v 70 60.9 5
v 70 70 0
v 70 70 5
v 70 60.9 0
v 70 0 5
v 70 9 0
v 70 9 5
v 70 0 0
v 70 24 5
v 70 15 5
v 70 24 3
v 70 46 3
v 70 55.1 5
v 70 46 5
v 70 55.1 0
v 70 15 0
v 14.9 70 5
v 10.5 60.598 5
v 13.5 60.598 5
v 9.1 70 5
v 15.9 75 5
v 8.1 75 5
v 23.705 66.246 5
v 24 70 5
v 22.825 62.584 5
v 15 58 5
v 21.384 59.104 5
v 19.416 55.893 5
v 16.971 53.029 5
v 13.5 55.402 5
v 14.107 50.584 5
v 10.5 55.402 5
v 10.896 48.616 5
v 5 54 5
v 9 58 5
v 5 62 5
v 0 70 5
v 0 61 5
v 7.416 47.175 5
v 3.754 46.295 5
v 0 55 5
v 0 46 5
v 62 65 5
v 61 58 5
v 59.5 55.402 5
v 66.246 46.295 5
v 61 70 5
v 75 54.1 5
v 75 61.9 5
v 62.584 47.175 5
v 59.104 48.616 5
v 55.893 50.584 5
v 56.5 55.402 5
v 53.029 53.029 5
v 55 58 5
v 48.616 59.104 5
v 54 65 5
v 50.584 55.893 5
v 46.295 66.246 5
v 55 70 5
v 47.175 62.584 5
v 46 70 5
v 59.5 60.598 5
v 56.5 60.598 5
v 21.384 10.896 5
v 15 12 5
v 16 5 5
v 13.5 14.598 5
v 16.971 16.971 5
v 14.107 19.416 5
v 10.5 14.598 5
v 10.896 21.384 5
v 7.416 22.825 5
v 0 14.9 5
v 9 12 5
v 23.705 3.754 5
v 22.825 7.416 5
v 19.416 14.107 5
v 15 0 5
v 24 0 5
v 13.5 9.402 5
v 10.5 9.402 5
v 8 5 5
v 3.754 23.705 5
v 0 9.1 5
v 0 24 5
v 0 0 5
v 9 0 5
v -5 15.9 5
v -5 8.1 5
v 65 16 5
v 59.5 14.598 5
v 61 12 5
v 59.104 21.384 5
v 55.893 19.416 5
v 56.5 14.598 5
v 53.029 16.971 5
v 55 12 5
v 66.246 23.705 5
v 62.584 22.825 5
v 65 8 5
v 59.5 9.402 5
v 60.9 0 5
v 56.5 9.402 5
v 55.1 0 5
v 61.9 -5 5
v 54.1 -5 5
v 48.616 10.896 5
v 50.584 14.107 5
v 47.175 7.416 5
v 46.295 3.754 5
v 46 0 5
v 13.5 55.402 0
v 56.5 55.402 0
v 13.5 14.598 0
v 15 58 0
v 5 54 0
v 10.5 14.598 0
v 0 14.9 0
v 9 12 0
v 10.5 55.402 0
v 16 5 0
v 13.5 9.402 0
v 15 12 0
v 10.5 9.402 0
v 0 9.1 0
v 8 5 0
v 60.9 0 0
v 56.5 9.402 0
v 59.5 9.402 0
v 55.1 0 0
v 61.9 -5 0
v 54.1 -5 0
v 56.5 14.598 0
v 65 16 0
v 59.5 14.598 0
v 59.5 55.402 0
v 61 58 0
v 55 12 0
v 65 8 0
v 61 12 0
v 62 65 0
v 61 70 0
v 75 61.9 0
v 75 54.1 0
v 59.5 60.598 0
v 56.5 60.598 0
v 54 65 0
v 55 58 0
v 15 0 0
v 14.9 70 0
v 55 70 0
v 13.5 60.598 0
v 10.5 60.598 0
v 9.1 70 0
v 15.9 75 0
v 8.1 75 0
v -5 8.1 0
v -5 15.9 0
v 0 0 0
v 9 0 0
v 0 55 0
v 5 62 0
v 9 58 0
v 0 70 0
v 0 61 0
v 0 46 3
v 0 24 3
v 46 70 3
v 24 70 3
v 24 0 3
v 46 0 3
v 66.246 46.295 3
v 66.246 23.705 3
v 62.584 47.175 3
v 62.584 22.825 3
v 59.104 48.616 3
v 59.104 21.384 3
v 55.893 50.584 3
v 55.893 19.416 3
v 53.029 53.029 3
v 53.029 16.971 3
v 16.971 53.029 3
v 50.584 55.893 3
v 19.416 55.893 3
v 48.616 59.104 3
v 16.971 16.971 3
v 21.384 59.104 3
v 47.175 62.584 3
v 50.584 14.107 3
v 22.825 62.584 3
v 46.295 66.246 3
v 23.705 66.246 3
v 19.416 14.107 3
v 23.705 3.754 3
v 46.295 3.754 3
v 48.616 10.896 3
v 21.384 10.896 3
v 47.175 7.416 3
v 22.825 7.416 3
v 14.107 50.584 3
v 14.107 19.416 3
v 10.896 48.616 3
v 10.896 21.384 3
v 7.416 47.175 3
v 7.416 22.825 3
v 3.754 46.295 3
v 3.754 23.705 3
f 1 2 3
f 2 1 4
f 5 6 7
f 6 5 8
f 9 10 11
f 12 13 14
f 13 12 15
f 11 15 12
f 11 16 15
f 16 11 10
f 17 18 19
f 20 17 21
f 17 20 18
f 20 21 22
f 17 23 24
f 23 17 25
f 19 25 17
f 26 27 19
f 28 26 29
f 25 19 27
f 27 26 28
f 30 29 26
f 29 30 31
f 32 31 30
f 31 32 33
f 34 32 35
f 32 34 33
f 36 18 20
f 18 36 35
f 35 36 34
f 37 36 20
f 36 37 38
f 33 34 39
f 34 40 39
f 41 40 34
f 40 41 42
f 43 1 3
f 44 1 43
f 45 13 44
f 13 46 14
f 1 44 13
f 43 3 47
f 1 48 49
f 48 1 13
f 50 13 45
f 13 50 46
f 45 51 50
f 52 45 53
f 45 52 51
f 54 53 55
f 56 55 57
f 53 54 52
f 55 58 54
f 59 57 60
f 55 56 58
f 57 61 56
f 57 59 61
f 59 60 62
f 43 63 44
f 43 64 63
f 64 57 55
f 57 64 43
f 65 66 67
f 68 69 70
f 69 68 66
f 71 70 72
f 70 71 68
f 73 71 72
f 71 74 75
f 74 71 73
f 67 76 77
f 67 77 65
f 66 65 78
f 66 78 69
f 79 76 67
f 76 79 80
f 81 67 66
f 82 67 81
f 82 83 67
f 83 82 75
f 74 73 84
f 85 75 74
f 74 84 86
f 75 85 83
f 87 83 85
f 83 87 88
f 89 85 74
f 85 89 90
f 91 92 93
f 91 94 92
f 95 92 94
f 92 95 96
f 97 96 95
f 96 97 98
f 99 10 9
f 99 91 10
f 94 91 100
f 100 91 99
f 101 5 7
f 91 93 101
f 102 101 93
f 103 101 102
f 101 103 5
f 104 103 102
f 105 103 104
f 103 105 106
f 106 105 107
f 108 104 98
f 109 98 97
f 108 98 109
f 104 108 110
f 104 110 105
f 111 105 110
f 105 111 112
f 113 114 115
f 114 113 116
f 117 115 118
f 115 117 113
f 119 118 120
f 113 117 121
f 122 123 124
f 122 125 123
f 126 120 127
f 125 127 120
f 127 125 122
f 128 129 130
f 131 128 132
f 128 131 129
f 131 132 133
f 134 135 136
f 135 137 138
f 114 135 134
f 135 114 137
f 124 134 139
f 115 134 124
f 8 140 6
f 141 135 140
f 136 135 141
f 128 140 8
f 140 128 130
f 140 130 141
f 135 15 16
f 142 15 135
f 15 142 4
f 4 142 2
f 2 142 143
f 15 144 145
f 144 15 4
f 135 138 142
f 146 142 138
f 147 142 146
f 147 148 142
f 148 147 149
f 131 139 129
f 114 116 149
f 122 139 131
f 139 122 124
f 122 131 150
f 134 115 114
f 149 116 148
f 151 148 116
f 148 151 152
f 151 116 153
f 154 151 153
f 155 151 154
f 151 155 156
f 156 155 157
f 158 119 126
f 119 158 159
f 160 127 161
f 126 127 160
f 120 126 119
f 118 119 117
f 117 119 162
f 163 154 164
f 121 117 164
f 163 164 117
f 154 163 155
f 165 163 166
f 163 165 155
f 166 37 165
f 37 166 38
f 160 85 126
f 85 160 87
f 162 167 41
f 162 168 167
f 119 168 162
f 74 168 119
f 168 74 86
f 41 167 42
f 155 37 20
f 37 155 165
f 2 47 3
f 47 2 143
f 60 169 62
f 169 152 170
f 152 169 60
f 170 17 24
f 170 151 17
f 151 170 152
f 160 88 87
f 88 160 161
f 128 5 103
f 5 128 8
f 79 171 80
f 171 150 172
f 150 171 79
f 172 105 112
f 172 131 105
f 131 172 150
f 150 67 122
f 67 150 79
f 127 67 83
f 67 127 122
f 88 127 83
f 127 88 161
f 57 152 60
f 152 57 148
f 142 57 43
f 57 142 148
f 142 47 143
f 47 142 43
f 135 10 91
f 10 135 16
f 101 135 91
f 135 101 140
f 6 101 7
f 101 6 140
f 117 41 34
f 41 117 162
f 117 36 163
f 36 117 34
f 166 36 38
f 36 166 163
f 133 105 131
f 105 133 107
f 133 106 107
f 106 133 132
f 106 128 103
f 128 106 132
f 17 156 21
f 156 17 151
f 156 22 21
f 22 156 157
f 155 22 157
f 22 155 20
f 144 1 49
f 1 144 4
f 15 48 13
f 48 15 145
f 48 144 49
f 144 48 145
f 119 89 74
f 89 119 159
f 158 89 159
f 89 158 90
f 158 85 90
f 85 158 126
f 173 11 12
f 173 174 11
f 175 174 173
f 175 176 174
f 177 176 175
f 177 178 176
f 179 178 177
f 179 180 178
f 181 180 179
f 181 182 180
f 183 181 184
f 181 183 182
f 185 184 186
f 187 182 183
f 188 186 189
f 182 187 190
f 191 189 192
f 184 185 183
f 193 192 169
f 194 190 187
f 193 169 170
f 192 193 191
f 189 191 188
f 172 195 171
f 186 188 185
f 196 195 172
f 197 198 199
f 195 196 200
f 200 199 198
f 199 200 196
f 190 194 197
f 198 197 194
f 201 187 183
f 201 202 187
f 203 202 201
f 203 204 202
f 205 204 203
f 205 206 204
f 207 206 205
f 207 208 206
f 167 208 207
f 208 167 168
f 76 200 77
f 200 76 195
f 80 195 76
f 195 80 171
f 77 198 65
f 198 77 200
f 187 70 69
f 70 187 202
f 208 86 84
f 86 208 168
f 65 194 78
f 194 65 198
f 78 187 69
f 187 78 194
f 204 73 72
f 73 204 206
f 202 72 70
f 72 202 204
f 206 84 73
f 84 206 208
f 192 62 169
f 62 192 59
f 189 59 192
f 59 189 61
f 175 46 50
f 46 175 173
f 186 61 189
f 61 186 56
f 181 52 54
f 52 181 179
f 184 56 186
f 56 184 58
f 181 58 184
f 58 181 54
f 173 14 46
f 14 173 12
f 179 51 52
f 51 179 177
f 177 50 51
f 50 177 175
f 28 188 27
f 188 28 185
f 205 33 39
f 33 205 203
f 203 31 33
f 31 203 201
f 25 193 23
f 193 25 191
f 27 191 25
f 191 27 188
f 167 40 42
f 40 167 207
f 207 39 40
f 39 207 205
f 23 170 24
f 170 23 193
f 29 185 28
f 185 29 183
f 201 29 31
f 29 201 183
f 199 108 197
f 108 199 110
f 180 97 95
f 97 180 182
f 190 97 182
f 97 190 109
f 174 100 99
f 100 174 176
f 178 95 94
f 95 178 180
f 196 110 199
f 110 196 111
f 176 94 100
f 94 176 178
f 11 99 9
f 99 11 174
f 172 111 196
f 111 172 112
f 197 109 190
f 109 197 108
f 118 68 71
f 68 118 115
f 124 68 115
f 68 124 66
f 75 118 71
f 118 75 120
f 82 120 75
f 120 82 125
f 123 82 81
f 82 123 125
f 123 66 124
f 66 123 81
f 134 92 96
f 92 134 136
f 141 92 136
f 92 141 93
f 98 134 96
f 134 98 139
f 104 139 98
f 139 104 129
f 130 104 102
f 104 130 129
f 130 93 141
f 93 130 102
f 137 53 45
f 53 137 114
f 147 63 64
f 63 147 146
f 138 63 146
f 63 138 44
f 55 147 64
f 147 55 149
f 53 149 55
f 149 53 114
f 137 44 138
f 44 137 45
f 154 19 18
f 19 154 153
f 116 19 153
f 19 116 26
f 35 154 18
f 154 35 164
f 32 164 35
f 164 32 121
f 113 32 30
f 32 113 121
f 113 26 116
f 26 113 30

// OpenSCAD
//side of the base
side = 70;
//width of the track
trackWidth = 22;
//Height of the pieces
height = 5;
//dimensions of the indents that fix the tiles
indentLength = 8;
indentWidth = 5;
indentSlope = 1; //difference between long and short sides of the indent
indentClearance = 0.2; //it applies to the out indents, reducing their length, higher values mean looser connections
//This is equal to the thickness of the tile under the track
trackOffset = 3;
//holes
holeRadius = 3;
holePosX = 12;
holePosY = holePosX;
//base();
//straight();
//curve();
//deadEnd();
crossIntersection();
//tIntersection();


module base(){
  
//indents out
translate([side-indentLength-indentClearance/2,-indentWidth,0])rotate([0,0,90]) indentOut();
translate([indentLength+indentClearance/2,side+indentWidth,0]) rotate([0,0,-90]) indentOut();
translate([side+indentWidth,side - indentLength-indentClearance/2,0]) rotate([0,0,180]) indentOut();
translate([-indentWidth,indentLength+indentClearance/2,0]) indentOut();

//indents in and base cube
difference(){
cube([side, side, height]);
translate([indentLength,indentWidth,0]) rotate([0,0,-90]) indentIn();
translate([side-indentLength,side-indentWidth,0]) rotate([0,0,90]) indentIn();
translate([side-indentWidth,indentLength,0]) indentIn();
translate([indentWidth,side -indentLength,0]) rotate([0,0,180]) indentIn();
}
}
//indent out Shape. smaller than indent in, according to clearance
module indentOut(){
    linear_extrude(height) {polygon(points = [[0,0],[indentWidth,indentSlope,],[indentWidth,indentLength-indentSlope-indentClearance],[0,indentLength-indentClearance]]);
    }
}
//indent in Shape
module indentIn(){
    linear_extrude(height) {polygon(points = [[0,0],[indentWidth,indentSlope,],[indentWidth,indentLength-indentSlope],[0,indentLength]]);
    }
}
//holes module
module holes(){
    translate([holePosX,holePosY,-1])
    cylinder(r=holeRadius,h= 2*height,$fn=6);
    translate([side-holePosX,holePosY,-1])
    cylinder(r=holeRadius,h= 2*height,$fn=6);
    translate([side-holePosX,side - holePosY,-1])
    cylinder(r=holeRadius,h= 2*height,$fn=6);
    translate([holePosX,side-holePosY,-1])
    cylinder(r=holeRadius,h= 2*height,$fn=6);
}
//straight
module straight(){
    difference(){
        base();
translate ([0,side/2-trackWidth/2,trackOffset]) cube ([side, trackWidth,height]);
        holes();
    }
}
//curve
module curve(){
    difference(){
        base();
translate([0,0,trackOffset])difference(){
    cylinder(r=side/2+trackWidth/2,h=height,$fn=40);
    cylinder(r=side/2-trackWidth/2,h=height,$fn=40);
}
 holes();
}
}
//deadEnd
module deadEnd(){
    difference(){
        base();
translate([side/2,side/2,trackOffset]) cylinder(r=trackWidth,h=height,$fn=40);
translate ([0,side/2-trackWidth/2,trackOffset]) cube ([side/2, trackWidth,height]);
        holes();
    }
}
//cross intersection
module crossIntersection(){
    difference(){
        base();
translate([0,0,trackOffset])difference(){
    cylinder(r=side/2+trackWidth/2,h=height,$fn=40);
    cylinder(r=side/2-trackWidth/2,h=height,$fn=40);
}
translate([side,side,trackOffset])difference(){
    cylinder(r=side/2+trackWidth/2,h=height,$fn=40);
    cylinder(r=side/2-trackWidth/2,h=height,$fn=40);
}
translate([0,side,trackOffset])difference(){
    cylinder(r=side/2+trackWidth/2,h=height,$fn=40);
    cylinder(r=side/2-trackWidth/2,h=height,$fn=40);
}
translate([side,0,trackOffset])difference(){
    cylinder(r=side/2+trackWidth/2,h=height,$fn=40);
    cylinder(r=side/2-trackWidth/2,h=height,$fn=40);
}
translate ([0,side/2-trackWidth/2,trackOffset]) cube ([side, trackWidth,height]);
 holes();
    }
}
//T intersection
module tIntersection(){
    difference(){
        base();
translate([0,0,trackOffset])difference(){
    cylinder(r=side/2+trackWidth/2,h=height,$fn=40);
    cylinder(r=side/2-trackWidth/2,h=height,$fn=40);
}
translate([side,0,trackOffset])difference(){
    cylinder(r=side/2+trackWidth/2,h=height,$fn=40);
    cylinder(r=side/2-trackWidth/2,h=height,$fn=40);
}
translate ([0,side/2-trackWidth/2,trackOffset]) cube ([side, trackWidth,height]);
 holes();


    }
}
